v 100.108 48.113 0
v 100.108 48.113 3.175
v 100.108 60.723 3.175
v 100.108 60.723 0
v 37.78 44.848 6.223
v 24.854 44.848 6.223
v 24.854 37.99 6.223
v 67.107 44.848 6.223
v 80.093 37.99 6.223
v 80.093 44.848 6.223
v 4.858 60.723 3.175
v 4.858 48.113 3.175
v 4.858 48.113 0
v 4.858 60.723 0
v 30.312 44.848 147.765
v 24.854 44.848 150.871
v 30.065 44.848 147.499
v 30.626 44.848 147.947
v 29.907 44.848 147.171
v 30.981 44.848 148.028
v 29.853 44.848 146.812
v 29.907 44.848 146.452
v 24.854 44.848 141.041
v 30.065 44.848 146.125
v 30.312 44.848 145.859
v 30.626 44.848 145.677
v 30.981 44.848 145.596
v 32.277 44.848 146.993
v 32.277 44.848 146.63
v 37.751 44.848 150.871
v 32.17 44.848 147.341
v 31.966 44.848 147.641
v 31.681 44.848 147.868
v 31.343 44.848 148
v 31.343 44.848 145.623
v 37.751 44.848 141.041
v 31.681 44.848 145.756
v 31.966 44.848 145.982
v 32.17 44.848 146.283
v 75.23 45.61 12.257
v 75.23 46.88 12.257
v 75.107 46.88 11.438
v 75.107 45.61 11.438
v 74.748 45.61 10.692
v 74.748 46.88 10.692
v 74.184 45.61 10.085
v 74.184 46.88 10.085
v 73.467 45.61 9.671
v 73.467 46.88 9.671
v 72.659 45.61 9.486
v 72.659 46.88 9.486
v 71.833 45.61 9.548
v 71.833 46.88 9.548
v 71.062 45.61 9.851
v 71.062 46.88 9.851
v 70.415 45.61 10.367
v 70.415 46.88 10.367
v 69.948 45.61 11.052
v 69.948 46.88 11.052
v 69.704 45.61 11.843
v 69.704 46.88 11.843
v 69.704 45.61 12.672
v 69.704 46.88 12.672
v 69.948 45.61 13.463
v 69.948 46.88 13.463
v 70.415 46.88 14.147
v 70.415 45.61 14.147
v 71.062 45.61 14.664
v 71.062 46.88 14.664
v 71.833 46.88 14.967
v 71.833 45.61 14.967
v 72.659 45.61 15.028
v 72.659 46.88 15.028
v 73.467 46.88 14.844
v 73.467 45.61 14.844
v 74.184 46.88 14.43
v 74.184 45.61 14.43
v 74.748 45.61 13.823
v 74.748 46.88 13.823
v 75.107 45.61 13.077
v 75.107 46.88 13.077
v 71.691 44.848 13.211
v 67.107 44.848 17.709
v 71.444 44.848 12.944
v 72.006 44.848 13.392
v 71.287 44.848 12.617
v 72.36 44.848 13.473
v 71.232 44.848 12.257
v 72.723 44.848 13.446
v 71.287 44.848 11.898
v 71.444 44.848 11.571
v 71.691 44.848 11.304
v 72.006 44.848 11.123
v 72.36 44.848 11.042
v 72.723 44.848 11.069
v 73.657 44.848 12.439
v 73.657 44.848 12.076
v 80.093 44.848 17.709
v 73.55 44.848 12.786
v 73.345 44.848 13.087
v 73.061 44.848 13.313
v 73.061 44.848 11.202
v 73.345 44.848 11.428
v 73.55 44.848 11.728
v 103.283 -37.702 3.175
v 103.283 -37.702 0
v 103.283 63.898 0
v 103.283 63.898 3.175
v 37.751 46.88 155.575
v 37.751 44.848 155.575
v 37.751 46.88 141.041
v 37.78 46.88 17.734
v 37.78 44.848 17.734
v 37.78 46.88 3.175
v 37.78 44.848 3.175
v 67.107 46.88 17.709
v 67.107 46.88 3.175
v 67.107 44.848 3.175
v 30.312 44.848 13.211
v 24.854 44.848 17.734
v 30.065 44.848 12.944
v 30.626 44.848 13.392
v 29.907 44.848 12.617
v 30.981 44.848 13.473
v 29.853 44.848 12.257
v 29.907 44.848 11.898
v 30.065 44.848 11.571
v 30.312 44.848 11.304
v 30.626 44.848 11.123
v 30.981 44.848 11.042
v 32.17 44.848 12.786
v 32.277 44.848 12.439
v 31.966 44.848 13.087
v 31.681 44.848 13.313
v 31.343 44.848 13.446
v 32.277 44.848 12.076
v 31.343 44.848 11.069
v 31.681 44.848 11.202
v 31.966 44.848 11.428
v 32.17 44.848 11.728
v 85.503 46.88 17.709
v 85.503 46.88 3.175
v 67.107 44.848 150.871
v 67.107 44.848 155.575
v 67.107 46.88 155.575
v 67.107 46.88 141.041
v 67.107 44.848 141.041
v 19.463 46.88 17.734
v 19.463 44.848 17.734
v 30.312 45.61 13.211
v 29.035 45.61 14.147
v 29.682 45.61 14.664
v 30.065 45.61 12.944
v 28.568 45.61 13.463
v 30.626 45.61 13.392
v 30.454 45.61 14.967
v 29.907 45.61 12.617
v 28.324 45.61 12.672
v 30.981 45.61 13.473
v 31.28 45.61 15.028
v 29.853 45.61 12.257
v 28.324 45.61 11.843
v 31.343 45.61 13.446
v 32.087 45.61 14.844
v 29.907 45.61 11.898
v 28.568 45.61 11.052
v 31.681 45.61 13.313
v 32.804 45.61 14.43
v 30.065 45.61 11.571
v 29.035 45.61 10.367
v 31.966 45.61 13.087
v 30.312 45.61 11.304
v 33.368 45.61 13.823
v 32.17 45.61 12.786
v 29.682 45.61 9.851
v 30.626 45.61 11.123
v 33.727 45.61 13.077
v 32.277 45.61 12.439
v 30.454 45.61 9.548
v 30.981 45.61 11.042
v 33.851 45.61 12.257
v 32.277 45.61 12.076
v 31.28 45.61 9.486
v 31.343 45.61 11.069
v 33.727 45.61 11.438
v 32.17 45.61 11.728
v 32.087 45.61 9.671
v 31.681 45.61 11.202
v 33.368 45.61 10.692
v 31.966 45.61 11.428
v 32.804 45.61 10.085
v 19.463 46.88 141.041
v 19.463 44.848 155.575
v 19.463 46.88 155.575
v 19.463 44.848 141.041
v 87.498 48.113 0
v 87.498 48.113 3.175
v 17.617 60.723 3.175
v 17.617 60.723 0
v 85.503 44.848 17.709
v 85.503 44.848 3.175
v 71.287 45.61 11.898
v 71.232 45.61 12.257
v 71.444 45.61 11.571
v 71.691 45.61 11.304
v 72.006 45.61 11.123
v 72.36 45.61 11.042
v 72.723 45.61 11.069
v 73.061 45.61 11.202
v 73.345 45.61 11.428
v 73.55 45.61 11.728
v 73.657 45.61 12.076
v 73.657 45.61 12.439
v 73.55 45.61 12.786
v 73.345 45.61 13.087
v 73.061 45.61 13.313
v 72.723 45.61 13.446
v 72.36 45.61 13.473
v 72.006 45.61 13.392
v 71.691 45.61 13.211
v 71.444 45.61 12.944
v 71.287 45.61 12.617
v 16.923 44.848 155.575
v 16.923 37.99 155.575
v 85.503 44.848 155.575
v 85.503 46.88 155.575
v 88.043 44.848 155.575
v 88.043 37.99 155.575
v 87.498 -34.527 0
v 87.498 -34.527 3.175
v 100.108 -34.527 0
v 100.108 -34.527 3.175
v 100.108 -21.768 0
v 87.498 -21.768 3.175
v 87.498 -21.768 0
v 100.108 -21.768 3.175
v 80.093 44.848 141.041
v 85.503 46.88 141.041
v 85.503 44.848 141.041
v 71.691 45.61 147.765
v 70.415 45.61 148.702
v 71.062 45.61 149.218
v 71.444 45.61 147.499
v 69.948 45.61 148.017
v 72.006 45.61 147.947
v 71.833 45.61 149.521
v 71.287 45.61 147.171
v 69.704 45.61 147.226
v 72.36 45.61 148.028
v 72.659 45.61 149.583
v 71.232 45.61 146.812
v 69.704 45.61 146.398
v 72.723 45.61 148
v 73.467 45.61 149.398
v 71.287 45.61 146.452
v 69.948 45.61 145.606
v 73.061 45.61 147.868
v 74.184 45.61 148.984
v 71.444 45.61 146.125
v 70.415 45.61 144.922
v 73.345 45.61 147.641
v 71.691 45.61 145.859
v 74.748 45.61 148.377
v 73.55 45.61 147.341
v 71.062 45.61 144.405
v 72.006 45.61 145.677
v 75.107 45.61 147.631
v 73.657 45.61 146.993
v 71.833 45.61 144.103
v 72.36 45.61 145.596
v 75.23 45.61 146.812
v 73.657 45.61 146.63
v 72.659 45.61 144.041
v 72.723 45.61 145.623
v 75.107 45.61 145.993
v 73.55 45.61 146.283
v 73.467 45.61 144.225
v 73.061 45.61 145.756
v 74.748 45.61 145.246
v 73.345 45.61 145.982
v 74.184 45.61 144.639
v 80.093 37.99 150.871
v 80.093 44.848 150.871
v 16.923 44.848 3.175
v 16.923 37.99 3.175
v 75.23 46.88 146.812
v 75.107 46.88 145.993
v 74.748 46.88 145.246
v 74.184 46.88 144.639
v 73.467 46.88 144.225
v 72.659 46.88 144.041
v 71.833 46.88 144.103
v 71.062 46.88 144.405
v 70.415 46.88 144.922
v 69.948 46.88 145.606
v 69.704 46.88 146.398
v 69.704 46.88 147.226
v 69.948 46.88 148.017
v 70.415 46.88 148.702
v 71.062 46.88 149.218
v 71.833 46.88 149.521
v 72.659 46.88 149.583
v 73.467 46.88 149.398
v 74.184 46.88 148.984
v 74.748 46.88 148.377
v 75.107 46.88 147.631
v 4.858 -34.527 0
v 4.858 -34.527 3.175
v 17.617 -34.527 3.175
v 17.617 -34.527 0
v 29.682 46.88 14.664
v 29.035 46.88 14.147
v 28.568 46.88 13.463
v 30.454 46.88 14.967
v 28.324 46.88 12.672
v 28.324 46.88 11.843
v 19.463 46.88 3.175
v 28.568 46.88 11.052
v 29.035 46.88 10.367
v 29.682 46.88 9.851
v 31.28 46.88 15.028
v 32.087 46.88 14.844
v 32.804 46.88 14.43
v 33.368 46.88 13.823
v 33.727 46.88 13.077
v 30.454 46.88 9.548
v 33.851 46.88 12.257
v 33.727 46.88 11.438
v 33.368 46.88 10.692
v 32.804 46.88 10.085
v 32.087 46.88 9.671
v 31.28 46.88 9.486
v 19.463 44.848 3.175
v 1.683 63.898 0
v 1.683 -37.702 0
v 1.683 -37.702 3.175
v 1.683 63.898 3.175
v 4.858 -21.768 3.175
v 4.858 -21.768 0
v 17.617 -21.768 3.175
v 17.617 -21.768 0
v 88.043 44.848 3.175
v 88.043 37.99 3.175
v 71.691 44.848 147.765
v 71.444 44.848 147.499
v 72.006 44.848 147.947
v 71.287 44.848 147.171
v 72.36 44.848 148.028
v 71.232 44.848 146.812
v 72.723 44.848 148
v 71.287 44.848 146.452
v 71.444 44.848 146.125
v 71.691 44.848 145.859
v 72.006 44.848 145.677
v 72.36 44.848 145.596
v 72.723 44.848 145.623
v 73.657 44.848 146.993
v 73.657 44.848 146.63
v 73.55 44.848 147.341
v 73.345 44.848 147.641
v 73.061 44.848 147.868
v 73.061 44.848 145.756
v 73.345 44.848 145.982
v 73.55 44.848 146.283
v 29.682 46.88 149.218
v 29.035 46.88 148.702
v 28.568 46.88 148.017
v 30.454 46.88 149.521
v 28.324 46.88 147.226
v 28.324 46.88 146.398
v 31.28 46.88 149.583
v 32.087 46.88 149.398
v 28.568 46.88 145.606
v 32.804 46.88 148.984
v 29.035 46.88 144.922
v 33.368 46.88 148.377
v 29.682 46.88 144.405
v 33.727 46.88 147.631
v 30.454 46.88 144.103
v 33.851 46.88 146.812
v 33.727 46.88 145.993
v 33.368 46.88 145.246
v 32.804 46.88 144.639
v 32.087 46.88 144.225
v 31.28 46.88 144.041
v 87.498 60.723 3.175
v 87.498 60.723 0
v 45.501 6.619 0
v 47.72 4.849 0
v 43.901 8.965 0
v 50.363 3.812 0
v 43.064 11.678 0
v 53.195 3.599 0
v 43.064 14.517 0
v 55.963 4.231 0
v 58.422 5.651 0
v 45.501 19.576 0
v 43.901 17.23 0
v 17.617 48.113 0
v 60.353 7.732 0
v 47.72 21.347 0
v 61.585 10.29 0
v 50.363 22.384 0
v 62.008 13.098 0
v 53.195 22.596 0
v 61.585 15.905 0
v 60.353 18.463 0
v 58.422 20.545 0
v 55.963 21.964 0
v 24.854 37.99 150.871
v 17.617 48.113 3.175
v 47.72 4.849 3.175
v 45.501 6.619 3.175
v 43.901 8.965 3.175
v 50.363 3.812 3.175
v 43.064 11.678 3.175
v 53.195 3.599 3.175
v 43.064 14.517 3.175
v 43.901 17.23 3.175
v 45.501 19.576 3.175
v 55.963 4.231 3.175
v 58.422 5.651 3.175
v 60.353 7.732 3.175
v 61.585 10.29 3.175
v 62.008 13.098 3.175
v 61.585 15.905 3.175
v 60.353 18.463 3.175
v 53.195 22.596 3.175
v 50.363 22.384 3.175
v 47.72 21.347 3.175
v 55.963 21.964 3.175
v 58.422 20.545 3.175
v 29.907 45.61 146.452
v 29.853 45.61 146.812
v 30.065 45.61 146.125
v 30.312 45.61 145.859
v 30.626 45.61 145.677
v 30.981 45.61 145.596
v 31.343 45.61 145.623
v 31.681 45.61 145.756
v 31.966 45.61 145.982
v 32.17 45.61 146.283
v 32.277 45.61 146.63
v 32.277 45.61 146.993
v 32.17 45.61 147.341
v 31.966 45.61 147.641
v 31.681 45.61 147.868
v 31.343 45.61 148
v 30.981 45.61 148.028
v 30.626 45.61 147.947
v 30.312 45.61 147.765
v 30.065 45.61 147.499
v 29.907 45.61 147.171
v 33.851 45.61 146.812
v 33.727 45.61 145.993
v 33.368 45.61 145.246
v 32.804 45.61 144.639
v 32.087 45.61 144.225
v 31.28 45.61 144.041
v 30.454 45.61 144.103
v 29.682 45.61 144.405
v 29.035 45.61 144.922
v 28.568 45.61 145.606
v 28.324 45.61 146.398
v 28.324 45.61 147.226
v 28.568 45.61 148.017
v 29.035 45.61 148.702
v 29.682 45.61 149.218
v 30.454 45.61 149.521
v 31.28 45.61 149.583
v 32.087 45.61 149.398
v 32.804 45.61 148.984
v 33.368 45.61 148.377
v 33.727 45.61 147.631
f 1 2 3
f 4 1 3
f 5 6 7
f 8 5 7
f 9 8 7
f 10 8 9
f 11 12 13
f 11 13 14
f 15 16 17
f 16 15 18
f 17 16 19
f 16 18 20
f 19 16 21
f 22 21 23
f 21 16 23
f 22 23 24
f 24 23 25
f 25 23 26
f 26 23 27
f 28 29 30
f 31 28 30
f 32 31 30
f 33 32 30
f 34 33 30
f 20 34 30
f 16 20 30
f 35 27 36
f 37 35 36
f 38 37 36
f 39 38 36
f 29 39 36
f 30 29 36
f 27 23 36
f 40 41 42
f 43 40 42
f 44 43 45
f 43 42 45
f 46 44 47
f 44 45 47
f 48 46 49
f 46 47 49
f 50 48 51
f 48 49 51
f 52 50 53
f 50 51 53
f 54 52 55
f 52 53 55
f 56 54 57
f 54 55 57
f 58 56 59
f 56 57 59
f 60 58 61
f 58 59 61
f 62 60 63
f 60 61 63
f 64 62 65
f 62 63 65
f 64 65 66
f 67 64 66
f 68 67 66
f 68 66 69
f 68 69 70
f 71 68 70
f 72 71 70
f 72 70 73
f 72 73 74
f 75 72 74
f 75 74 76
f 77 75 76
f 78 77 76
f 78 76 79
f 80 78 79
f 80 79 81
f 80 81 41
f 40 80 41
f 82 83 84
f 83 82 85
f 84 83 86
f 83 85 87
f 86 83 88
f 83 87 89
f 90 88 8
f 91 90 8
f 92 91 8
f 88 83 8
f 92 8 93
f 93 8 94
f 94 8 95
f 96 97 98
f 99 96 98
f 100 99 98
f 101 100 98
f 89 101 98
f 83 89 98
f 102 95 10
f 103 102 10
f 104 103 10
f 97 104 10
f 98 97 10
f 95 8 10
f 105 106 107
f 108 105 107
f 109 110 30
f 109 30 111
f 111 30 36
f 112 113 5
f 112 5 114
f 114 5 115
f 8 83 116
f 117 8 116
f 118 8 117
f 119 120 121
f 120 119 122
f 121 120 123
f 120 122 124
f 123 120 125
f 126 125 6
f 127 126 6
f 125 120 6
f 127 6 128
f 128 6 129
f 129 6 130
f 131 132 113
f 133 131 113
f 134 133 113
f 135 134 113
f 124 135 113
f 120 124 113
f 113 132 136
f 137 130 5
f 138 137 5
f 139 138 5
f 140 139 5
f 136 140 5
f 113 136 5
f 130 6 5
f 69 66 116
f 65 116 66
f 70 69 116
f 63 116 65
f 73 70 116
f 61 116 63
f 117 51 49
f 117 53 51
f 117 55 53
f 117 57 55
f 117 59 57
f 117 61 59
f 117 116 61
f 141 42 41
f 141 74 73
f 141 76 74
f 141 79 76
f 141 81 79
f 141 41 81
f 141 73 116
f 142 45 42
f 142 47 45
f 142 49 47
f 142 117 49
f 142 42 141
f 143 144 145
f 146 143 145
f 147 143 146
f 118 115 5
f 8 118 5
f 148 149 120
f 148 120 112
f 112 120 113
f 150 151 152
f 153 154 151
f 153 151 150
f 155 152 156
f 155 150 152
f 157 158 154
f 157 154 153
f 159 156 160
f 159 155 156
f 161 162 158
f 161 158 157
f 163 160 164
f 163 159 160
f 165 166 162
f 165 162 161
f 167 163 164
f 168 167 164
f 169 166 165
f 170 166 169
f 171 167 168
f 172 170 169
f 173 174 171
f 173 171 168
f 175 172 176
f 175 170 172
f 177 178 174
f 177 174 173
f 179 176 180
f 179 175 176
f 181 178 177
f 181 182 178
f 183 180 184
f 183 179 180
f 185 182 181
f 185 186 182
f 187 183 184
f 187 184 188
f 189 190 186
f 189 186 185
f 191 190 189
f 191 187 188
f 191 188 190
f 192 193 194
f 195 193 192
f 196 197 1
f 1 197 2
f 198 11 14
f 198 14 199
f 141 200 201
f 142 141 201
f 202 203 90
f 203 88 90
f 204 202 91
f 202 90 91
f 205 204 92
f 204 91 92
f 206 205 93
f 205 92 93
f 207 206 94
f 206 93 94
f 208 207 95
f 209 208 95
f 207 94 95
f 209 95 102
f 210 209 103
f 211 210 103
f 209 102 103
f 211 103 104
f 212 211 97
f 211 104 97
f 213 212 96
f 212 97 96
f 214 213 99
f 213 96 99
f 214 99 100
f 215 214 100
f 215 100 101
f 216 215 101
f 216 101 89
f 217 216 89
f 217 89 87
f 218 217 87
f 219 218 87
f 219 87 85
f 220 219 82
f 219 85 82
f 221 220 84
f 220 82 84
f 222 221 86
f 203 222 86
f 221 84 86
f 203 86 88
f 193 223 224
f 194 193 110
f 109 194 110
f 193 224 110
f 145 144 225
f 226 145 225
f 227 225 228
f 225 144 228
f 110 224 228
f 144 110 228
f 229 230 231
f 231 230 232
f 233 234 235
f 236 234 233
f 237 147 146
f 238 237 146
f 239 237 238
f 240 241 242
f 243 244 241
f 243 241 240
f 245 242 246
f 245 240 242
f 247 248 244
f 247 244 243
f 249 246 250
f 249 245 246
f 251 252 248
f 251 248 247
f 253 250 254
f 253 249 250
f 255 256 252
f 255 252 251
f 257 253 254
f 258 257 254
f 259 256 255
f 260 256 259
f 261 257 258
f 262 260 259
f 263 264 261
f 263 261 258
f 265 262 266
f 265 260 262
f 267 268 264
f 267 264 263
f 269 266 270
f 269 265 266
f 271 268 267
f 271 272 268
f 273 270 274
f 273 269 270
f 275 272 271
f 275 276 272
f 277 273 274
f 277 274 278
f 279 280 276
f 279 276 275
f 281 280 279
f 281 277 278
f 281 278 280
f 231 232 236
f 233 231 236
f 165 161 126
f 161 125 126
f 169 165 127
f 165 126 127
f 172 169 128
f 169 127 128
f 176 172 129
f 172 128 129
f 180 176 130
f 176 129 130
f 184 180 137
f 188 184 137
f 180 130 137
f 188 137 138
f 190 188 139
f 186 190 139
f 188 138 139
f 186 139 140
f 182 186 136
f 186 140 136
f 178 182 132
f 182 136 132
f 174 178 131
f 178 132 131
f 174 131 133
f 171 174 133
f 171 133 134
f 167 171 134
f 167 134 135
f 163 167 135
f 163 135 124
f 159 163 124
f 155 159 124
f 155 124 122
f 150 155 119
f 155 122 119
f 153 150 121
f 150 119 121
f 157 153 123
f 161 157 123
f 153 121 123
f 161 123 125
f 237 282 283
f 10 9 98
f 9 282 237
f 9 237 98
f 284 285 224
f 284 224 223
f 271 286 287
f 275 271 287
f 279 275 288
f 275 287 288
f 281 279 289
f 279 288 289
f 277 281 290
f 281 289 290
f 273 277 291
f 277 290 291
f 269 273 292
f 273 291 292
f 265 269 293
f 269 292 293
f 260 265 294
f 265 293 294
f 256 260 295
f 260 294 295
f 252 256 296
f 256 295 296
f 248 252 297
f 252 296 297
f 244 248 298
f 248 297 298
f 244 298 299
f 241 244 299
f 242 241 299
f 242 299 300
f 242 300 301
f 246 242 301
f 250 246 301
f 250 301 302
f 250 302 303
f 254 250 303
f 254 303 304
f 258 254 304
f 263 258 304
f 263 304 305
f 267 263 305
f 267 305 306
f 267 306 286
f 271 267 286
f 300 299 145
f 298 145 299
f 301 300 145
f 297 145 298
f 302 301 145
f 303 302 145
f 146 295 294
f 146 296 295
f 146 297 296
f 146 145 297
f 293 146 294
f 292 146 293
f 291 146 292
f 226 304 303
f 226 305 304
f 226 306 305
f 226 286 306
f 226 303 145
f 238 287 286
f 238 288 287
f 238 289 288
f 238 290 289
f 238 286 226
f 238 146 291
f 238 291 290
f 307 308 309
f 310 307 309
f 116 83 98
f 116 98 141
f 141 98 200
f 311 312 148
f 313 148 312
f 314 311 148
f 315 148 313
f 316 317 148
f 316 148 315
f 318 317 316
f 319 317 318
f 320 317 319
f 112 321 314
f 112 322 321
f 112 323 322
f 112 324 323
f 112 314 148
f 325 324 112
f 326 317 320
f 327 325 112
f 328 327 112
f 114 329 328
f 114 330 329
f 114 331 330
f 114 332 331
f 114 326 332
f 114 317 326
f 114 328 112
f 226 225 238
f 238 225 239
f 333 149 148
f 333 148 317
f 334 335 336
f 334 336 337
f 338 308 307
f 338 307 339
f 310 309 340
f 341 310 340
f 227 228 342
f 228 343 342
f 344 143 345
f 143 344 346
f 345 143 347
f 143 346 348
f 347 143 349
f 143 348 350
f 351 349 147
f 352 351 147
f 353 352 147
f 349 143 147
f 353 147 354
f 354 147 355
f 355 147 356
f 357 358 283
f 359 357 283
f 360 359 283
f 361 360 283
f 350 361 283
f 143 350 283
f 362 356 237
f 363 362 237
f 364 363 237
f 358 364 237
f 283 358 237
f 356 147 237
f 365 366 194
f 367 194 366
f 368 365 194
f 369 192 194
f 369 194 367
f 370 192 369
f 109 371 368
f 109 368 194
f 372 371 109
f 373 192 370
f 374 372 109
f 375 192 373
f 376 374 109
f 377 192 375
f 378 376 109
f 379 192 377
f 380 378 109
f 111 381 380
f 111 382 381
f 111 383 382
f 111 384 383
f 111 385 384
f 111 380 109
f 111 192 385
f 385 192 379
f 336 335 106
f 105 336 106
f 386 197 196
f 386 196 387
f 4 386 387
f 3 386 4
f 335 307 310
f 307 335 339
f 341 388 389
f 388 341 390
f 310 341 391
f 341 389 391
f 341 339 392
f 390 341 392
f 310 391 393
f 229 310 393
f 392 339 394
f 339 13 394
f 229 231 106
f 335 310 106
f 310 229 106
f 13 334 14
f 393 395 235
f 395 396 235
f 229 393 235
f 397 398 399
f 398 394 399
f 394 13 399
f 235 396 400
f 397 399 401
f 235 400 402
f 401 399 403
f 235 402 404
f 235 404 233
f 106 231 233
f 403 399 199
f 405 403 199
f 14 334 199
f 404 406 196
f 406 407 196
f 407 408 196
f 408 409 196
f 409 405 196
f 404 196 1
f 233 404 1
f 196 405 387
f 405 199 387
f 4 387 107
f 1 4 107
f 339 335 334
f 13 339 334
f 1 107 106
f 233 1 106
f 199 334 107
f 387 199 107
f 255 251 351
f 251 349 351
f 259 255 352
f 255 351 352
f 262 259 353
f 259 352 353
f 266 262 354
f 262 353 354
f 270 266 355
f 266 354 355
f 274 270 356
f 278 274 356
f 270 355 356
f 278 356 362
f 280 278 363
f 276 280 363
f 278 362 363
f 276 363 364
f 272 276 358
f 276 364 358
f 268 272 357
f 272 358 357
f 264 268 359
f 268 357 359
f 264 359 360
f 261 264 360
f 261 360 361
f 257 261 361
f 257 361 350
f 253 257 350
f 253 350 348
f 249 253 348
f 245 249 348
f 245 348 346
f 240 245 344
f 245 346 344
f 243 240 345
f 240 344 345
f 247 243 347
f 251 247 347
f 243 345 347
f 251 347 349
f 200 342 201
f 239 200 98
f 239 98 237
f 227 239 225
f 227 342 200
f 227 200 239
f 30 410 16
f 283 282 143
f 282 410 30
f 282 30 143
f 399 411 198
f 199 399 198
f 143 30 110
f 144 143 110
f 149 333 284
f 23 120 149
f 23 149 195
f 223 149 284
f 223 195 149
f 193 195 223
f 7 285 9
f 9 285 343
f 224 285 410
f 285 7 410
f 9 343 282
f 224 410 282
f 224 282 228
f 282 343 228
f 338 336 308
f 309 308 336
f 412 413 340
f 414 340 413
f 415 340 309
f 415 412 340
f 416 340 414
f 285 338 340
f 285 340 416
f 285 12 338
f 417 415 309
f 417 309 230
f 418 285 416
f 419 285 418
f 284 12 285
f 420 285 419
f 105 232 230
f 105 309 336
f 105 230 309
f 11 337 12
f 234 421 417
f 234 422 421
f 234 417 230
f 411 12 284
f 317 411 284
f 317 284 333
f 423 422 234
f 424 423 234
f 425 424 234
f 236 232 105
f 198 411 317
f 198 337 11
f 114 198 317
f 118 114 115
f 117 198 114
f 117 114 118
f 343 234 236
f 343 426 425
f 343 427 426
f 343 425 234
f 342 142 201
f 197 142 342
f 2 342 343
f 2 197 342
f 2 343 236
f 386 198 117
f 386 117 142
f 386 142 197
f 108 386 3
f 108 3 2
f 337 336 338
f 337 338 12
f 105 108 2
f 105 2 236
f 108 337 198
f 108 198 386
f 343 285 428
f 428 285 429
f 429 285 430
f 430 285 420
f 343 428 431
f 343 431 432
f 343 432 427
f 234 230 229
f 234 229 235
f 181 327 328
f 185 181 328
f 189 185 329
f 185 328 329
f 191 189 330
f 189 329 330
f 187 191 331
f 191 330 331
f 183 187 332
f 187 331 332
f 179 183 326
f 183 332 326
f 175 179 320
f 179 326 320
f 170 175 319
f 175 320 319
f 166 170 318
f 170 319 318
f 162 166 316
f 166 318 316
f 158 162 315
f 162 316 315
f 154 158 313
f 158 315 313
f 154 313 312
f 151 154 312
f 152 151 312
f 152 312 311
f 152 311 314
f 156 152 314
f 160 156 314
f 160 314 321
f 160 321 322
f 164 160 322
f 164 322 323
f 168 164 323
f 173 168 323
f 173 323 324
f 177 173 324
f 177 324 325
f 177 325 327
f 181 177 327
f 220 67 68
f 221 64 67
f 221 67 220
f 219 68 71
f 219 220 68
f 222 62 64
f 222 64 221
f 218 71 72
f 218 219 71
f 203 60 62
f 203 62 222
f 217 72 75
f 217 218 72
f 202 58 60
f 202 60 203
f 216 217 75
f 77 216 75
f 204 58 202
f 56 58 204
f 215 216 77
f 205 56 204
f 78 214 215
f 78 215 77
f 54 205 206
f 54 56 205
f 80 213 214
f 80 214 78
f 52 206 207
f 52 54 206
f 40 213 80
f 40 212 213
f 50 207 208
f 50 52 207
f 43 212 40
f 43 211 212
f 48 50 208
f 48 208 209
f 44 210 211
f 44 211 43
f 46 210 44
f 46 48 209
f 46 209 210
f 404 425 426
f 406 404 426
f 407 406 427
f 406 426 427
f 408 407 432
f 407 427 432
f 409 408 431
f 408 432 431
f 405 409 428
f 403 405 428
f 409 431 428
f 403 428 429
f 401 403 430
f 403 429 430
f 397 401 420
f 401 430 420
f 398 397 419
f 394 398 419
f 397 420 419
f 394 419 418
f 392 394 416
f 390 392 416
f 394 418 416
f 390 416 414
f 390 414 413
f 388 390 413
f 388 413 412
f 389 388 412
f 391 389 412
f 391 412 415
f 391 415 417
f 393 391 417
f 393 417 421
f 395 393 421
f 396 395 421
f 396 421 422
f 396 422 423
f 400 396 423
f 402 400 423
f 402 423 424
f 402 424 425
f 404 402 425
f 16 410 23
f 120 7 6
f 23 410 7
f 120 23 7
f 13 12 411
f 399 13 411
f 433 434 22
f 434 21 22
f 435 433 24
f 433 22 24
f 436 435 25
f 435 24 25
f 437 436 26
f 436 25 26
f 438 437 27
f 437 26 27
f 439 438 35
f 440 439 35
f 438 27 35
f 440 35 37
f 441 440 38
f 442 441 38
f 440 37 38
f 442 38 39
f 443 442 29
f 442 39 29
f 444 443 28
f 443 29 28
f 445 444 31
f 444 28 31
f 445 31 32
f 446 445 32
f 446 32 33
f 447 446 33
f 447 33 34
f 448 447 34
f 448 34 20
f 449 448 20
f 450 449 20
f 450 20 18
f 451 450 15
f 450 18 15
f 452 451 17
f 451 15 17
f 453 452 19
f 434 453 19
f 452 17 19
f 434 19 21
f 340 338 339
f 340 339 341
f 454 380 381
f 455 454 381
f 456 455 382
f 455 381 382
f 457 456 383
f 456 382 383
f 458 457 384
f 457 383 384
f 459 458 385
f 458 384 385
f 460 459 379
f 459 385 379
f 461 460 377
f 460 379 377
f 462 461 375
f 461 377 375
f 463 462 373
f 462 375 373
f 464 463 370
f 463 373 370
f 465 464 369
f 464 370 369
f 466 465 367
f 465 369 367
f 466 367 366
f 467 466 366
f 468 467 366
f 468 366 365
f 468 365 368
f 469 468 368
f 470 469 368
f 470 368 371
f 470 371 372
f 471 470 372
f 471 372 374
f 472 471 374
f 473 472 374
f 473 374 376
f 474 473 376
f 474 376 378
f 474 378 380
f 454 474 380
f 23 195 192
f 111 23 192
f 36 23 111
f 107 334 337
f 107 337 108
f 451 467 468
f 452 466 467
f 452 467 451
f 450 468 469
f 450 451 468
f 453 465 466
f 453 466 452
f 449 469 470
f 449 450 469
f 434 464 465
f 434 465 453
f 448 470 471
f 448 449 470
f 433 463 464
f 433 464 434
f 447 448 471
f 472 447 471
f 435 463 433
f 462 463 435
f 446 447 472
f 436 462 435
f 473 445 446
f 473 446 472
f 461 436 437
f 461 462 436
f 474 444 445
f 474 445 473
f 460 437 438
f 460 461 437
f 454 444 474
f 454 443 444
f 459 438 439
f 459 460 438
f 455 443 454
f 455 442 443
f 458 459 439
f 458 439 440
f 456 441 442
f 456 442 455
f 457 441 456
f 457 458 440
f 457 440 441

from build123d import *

# Parameters (mm, degrees)
SKETCH1_W                                           = 101.6
SKETCH1_H                                           = 101.6
BOSS_EXTRUDE1_DEPTH                                 = 3.175
SKETCH19_W                                          = 12.75921203
SKETCH19_H                                          = 12.60998148
SKETCH19_W_2                                        = 12.60998148
SKETCH19_H_2                                        = 12.75921203
CUT_EXTRUDE1_DEPTH                                  = 3.175
F_3_4_0_75_DIAMETER_HOLE1_D                         = 19.05
SKETCH29_W                                          = 71.12
SKETCH29_H                                          = 6.858
BOSS_EXTRUDE11_DEPTH                                = 3.048
SKETCH30_W                                          = 7.950155684
SKETCH30_H                                          = 6.858
SKETCH30_W_2                                        = 7.931445158
BOSS_EXTRUDE12_DEPTH                                = 149.352
SKETCH31_W                                          = 4.703535678
SKETCH31_H                                          = 6.858
BOSS_EXTRUDE13_DEPTH                                = 55.88
SKETCH32_W                                          = 18.396349522
SKETCH32_H                                          = 14.53383174
SKETCH32_W_2                                        = 18.288
SKETCH32_H_2                                        = 14.533831847
SKETCH32_W_3                                        = 18.317097516
SKETCH32_H_3                                        = 14.559025954
BOSS_EXTRUDE14_DEPTH                                = 2.032
CBORE_FOR_2_BINDING_HEAD_MACHINE_SCREW1_D           = 2.4384
CBORE_FOR_2_BINDING_HEAD_MACHINE_SCREW1_CBORE_D     = 5.55752
CBORE_FOR_2_BINDING_HEAD_MACHINE_SCREW1_CBORE_DEPTH = 1.27


with BuildPart() as part:
    # Sketch1 → Boss-Extrude1 (new body)
    with BuildSketch(Plane.XY):
        with Locations((52.482861157, 13.097719286)):
            Rectangle(SKETCH1_W, SKETCH1_H)
    extrude(amount=BOSS_EXTRUDE1_DEPTH)

    # Sketch19 → Cut-Extrude1 (cut)
    with BuildSketch(Plane.XY.offset(3.175)):
        with Locations((11.237467172, 54.417728546)):
            Rectangle(SKETCH19_W, SKETCH19_H)
        with Locations((93.802870417, -28.147674699)):
            Rectangle(SKETCH19_W_2, SKETCH19_H_2)
        with Locations((93.802870417, 54.417728546)):
            Rectangle(SKETCH19_W_2, SKETCH19_H)
        with Locations((11.237467172, -28.147674699)):
            Rectangle(SKETCH19_W, SKETCH19_H_2)
    extrude(amount=-CUT_EXTRUDE1_DEPTH, mode=Mode.SUBTRACT)

    # 3/4 (0.75) Diameter Hole1 (through all)
    with Locations(Plane(origin=(0, 0, 0), x_dir=(-1, 0, 0), z_dir=(0, 0, -1))):
        with Locations((-52.482861157, 13.097719286)):
            Hole(F_3_4_0_75_DIAMETER_HOLE1_D / 2)

    # Sketch29 → Boss-Extrude11 (add)
    with BuildSketch(Plane.XY.offset(3.175)):
        with Locations((52.482988157, 41.418719286)):
            Rectangle(SKETCH29_W, SKETCH29_H)
    extrude(amount=BOSS_EXTRUDE11_DEPTH)

    # Sketch30 → Boss-Extrude12 (add)
    with BuildSketch(Plane.XY.offset(6.223)):
        with Locations((84.067910315, 41.418719286)):
            Rectangle(SKETCH30_W, SKETCH30_H)
        with Locations((20.888710736, 41.418719286)):
            Rectangle(SKETCH30_W_2, SKETCH30_H)
    extrude(amount=BOSS_EXTRUDE12_DEPTH)

    # Sketch31 → Boss-Extrude13 (add)
    with BuildSketch(Plane.ZY.offset(-80.092832473)):
        with Locations((153.223232161, 41.418719286)):
            Rectangle(SKETCH31_W, SKETCH31_H)
    extrude(amount=BOSS_EXTRUDE13_DEPTH)

    # Sketch32 → Boss-Extrude14 (add)
    with BuildSketch(Plane(origin=(0, 44.847719286, 0), x_dir=(1, 0, 0), z_dir=(0, 1, 0))):
        with Locations((76.304813396, -148.30808413)):
            Rectangle(SKETCH32_W, SKETCH32_H)
        with Locations((28.606988157, -148.30808413)):
            Rectangle(SKETCH32_W_2, SKETCH32_H)
        with Locations((76.304813396, -10.441915924)):
            Rectangle(SKETCH32_W, SKETCH32_H_2)
        with Locations((28.621536915, -10.454512977)):
            Rectangle(SKETCH32_W_3, SKETCH32_H_3)
    extrude(amount=BOSS_EXTRUDE14_DEPTH)

    # CBORE for #2 Binding Head Machine Screw1 (through all)
    with Locations(Plane(origin=(0, 46.879719286, 0), x_dir=(1, 0, 0), z_dir=(0, 1, 0))):
        with Locations((31.071863114, -12.257454761), (72.45160574, -12.257454761), (72.45160574, -146.811730834), (31.071863114, -146.811730834)):
            CounterBoreHole(CBORE_FOR_2_BINDING_HEAD_MACHINE_SCREW1_D / 2, CBORE_FOR_2_BINDING_HEAD_MACHINE_SCREW1_CBORE_D / 2, CBORE_FOR_2_BINDING_HEAD_MACHINE_SCREW1_CBORE_DEPTH)


solid = part.part
